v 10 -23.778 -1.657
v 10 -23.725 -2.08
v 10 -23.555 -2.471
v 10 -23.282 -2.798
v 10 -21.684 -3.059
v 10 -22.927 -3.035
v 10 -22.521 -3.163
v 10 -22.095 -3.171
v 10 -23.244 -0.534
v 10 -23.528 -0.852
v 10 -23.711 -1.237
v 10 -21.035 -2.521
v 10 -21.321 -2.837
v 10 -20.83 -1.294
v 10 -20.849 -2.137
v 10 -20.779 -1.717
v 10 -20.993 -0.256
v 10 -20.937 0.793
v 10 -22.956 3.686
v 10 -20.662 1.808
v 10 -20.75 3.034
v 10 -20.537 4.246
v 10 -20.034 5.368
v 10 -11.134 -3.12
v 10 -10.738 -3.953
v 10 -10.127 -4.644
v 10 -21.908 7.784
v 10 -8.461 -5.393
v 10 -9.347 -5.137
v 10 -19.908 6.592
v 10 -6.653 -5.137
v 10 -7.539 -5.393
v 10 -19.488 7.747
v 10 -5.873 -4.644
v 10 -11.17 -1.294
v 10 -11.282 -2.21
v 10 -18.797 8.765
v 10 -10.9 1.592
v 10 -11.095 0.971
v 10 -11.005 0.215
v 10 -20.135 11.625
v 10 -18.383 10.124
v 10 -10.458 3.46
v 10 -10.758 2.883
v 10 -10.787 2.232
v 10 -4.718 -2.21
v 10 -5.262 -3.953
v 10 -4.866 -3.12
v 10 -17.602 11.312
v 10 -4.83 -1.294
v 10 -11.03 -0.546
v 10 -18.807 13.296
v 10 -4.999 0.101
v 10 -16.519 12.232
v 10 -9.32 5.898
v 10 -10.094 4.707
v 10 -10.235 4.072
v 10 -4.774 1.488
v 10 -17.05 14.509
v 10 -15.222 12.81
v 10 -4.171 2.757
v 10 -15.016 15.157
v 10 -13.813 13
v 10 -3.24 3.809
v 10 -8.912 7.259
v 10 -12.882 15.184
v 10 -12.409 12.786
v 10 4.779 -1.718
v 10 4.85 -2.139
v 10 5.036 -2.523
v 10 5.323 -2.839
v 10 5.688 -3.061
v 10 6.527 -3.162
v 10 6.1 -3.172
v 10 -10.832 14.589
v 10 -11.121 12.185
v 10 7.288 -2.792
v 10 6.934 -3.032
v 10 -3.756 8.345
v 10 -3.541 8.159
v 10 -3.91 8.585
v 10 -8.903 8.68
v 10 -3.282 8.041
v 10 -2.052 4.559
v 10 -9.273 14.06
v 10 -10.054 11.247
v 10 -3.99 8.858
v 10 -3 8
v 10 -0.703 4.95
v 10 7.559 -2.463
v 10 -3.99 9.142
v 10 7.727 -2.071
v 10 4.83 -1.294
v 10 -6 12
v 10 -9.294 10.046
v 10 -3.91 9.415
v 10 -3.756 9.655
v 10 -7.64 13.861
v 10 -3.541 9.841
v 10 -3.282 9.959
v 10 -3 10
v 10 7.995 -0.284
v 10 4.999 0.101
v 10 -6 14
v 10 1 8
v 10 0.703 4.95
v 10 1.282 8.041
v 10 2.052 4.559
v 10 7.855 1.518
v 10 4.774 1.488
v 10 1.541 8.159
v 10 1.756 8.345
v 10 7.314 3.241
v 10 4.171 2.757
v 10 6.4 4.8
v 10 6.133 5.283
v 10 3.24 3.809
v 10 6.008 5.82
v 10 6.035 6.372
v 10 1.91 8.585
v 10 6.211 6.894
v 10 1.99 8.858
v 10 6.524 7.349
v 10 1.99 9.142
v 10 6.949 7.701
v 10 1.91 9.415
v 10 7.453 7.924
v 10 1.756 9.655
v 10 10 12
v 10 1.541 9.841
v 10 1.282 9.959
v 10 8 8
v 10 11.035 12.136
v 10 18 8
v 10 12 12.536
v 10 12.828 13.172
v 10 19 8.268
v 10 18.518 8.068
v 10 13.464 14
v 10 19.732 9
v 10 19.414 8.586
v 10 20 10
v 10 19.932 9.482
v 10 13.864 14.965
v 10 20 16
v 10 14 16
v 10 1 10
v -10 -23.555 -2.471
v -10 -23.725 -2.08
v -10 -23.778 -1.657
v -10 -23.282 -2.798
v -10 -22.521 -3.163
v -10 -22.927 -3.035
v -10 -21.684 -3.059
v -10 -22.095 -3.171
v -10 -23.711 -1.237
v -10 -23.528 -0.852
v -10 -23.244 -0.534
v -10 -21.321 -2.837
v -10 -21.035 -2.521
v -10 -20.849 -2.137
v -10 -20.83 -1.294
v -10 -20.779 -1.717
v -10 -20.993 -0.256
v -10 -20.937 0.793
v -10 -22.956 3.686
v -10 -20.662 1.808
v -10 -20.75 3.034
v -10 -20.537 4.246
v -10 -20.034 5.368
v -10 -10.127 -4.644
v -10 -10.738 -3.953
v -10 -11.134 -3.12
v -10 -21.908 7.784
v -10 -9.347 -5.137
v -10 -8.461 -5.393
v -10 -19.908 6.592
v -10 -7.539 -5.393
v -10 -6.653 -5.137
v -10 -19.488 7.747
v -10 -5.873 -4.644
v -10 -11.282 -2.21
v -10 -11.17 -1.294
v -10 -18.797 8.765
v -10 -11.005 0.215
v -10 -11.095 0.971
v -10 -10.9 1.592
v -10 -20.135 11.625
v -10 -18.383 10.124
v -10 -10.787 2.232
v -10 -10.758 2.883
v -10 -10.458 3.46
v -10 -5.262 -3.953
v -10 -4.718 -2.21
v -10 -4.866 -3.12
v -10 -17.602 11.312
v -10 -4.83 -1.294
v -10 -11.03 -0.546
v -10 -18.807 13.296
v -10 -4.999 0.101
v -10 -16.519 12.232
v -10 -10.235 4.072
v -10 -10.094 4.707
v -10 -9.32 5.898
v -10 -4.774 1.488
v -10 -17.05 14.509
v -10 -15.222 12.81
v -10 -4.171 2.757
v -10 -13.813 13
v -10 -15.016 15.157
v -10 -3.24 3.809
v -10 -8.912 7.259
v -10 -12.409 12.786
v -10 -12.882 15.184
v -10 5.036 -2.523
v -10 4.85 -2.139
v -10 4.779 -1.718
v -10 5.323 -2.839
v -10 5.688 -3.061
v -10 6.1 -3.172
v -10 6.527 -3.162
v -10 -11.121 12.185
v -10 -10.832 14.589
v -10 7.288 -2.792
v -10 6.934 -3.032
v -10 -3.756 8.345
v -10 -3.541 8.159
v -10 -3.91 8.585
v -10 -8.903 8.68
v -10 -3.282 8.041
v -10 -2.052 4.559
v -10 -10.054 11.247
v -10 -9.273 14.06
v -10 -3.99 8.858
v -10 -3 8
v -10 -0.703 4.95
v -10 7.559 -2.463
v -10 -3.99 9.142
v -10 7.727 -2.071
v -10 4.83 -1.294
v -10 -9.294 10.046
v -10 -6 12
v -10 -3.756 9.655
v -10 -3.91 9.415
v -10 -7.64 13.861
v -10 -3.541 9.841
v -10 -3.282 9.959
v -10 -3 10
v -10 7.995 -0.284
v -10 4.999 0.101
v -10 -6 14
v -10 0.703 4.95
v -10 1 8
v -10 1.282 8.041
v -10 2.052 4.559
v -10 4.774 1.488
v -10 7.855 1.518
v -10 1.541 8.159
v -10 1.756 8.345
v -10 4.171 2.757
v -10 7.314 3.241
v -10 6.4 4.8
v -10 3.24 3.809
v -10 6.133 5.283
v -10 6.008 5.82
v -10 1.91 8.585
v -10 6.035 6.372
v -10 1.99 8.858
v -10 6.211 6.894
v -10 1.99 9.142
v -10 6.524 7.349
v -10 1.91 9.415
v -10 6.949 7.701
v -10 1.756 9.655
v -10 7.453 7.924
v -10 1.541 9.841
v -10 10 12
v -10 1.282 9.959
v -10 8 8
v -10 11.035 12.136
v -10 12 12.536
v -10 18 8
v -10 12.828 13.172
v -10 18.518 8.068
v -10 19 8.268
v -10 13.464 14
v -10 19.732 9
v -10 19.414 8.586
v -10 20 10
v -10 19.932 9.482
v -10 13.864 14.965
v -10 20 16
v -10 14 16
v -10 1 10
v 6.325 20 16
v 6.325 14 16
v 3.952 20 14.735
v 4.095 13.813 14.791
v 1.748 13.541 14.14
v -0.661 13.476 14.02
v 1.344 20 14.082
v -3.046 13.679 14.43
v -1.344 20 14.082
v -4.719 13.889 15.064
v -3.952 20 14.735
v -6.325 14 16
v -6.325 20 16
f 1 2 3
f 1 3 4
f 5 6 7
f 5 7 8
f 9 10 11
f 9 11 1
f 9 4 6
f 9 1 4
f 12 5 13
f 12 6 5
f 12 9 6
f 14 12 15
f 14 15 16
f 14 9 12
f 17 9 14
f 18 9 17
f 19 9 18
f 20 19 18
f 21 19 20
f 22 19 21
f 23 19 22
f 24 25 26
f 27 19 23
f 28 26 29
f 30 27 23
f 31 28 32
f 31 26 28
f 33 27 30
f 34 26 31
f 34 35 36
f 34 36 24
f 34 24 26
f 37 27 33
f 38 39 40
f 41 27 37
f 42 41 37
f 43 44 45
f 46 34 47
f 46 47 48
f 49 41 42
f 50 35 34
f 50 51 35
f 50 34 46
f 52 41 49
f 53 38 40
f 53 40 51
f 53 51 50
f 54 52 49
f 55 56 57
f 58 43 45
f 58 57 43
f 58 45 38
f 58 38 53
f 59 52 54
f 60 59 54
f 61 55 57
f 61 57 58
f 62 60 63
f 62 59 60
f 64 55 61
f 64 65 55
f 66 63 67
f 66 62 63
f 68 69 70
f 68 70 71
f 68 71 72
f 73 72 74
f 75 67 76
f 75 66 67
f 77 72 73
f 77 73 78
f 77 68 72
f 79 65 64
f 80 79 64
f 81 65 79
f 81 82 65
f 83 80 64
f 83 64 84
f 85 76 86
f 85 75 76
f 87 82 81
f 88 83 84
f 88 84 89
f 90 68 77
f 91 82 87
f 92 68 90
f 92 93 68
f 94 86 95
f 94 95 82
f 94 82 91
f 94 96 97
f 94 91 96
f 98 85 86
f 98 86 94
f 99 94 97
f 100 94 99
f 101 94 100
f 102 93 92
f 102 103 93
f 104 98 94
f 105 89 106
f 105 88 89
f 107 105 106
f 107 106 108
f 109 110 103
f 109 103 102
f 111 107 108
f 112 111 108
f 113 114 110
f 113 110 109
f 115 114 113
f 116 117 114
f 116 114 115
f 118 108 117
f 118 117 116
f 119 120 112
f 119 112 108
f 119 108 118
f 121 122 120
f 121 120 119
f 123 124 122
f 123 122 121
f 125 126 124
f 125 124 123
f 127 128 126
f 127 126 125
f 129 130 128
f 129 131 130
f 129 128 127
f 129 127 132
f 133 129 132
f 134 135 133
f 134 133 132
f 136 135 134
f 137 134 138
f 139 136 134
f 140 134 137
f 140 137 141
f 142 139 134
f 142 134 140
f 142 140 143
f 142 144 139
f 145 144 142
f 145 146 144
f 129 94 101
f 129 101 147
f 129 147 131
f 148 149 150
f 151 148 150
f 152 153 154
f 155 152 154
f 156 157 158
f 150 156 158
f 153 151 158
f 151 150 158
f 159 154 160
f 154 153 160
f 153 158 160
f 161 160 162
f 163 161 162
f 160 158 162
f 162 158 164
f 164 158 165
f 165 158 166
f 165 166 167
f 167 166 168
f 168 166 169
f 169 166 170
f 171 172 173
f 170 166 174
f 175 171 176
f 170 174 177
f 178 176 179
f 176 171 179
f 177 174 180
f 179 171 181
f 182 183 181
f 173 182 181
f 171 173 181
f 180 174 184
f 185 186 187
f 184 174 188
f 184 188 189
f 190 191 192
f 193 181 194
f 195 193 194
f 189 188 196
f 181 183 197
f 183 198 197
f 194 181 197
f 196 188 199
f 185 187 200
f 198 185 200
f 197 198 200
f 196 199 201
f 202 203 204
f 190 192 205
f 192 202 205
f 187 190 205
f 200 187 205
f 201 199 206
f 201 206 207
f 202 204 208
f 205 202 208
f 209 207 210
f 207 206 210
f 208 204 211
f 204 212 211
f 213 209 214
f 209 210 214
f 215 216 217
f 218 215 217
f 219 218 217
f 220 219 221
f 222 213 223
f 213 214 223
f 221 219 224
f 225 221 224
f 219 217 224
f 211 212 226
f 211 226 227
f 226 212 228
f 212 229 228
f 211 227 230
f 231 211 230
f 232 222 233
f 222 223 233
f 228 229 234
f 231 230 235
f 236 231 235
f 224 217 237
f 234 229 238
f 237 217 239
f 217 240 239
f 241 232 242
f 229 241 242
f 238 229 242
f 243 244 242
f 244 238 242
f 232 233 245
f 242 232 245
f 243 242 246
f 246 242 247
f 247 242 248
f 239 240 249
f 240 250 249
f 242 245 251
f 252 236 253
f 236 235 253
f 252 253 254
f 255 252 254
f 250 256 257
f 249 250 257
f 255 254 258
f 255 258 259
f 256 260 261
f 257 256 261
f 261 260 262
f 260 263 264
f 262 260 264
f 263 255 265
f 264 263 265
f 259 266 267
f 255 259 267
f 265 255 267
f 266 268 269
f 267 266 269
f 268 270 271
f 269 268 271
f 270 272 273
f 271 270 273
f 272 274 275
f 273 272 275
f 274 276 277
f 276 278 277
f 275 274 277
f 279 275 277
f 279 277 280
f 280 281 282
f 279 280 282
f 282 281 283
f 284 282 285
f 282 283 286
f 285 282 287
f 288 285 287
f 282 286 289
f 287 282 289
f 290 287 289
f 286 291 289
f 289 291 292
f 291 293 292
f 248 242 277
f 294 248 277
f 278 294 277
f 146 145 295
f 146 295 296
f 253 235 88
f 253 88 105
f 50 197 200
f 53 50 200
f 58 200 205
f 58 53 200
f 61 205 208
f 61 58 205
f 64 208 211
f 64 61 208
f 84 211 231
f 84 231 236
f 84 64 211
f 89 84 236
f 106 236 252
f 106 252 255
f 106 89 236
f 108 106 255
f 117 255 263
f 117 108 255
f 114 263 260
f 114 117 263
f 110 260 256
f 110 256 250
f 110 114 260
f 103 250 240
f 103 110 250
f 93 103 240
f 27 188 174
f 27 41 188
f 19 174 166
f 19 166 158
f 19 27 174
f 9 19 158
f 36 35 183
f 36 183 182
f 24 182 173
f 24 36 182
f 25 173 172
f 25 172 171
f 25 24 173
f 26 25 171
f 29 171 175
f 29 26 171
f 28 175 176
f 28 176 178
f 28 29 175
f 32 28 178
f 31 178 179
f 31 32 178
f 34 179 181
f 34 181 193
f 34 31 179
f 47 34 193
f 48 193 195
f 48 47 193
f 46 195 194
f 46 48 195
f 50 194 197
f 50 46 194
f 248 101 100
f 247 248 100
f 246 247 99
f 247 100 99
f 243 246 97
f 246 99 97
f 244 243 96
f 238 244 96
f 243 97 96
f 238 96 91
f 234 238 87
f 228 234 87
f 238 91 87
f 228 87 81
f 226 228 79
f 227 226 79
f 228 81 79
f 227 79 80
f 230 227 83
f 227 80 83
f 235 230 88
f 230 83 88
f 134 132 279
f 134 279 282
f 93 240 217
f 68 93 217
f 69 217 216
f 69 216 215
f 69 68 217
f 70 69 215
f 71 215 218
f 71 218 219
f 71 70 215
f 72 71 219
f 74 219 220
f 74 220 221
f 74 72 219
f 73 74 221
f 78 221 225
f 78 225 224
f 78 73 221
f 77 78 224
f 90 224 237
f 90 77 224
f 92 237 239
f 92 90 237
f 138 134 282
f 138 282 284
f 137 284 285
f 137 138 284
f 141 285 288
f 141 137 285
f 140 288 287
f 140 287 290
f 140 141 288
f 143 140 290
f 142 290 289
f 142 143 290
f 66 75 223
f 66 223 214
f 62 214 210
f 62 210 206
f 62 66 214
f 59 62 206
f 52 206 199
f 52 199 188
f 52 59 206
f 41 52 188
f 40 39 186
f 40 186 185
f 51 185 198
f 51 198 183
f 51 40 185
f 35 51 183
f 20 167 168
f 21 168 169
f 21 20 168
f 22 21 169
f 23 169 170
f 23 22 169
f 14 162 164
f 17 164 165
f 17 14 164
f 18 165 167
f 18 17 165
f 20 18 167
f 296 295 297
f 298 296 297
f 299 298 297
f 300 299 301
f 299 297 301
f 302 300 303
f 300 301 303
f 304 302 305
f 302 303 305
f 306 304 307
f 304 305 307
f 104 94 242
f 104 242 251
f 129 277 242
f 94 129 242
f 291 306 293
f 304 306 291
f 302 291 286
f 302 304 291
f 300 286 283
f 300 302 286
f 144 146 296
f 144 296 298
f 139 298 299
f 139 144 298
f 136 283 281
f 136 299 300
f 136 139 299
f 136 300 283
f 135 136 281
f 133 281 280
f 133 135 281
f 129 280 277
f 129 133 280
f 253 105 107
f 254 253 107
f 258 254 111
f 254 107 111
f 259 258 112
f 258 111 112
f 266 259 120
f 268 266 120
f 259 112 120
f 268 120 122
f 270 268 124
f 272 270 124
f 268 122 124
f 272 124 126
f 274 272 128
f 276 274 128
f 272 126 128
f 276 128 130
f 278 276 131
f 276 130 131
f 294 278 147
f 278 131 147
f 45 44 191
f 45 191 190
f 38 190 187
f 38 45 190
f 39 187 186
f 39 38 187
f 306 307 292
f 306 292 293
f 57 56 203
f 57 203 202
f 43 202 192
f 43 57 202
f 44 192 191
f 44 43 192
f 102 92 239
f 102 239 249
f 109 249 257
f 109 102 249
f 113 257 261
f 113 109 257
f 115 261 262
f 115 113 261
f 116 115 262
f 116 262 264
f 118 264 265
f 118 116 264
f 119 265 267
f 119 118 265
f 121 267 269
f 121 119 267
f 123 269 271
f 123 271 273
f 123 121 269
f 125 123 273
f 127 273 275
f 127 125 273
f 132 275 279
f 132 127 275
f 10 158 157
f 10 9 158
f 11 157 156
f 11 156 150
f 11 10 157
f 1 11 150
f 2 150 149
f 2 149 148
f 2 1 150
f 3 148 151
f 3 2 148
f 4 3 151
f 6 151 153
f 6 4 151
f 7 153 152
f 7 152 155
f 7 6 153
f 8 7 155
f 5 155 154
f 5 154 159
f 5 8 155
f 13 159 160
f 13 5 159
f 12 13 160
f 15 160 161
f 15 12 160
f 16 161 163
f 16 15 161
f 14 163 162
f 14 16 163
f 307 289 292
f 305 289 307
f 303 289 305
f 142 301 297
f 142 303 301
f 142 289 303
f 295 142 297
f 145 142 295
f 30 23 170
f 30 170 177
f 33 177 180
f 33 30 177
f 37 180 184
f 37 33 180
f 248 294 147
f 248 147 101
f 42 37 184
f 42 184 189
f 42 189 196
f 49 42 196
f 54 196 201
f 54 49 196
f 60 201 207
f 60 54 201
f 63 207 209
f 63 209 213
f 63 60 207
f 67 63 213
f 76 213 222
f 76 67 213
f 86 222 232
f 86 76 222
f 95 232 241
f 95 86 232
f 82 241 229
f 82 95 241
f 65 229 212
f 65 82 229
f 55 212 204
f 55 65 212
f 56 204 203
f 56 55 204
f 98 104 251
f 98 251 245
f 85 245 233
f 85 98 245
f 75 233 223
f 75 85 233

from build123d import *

# Parameters (mm, degrees)
F1_DEPTH = 10
F3_DEPTH = 20
F5_DEPTH = 7.5358984849


with BuildPart() as f1:
    # F0 (on Right) → F1 (new body, symmetric)
    with BuildSketch(Plane.YZ):
        with BuildLine():
            ThreePointArc((-20.8296291314, -1.2940952255), (-20.9926964007, 0.2701530127), (-20.6617935804, 1.8076727064))
            ThreePointArc((-20.6617935804, 1.8076727064), (-20.6809628133, 3.646611731), (-20.0339954379, 5.3680928987))
            ThreePointArc((-20.0339954379, 5.3680928987), (-19.7335450365, 7.1824230098), (-18.7974744816, 8.7654063047))
            ThreePointArc((-18.7974744816, 8.7654063047), (-11.7433151518, 12.5315389352), (-10.0940139115, 4.7069159885))
            ThreePointArc((-10.0940139115, 4.7069159885), (-10.3366188286, 3.7622215766), (-10.7580105429, 2.8826002371))
            ThreePointArc((-10.7580105429, 2.8826002371), (-10.8328852831, 1.9101299543), (-11.0951304678, 0.9706981363))
            ThreePointArc((-11.0951304678, 0.9706981363), (-11.0027569299, -0.1660171642), (-11.1703708686, -1.2940952255))
            ThreePointArc((-11.1703708686, -1.2940952255), (-8, -5.4258029827), (-4.8296291314, -1.2940952255))
            ThreePointArc((-4.8296291314, -1.2940952255), (0, 5), (4.8296291314, -1.2940952255))
            ThreePointArc((4.8296291314, -1.2940952255), (5.8902893032, -3.1312125326), (7.7274066103, -2.0705523608))
            ThreePointArc((7.7274066103, -2.0705523608), (7.8547454968, 1.517555001), (6.4, 4.8))
            ThreePointArc((6.4, 4.8), (6.211145618, 6.894427191), (8, 8))
            Line((8, 8), (18, 8))
            ThreePointArc((18, 8), (19.4142135624, 8.5857864376), (20, 10))
            Line((20, 10), (20, 16))
            Line((20, 16), (14, 16))
            ThreePointArc((14, 16), (12.8284271247, 13.1715728753), (10, 12))
            Line((10, 12), (-6, 12))
            Line((-6, 12), (-6, 14))
            ThreePointArc((-6, 14), (-8.4616553345, 13.9180532248), (-10.8315712253, 14.5888444966))
            ThreePointArc((-10.8315712253, 14.5888444966), (-16.0570828985, 14.9079319058), (-20.135090638, 11.625))
            ThreePointArc((-20.135090638, 11.625), (-22.5254325043, 5.7591136901), (-23.2438614431, -0.5342332969))
            ThreePointArc((-23.2438614431, -0.5342332969), (-22.7288527683, -3.1131272319), (-20.8296291314, -1.2940952255))
        make_face()
    extrude(amount=F1_DEPTH, both=True)

    # F2 (on face) → F3 (cut, through all)
    with BuildSketch(Plane.YZ.offset(10)):
        with BuildLine():
            Line((1, 10), (-3, 10))
            ThreePointArc((-3, 10), (-4, 9), (-3, 8))
            Line((-3, 8), (1, 8))
            ThreePointArc((1, 8), (2, 9), (1, 10))
        make_face()
    extrude(amount=-F3_DEPTH, mode=Mode.SUBTRACT)

    # F4 (on face) → F5 (cut, up to face)
    with BuildSketch(Plane(origin=(0, 20, 0), x_dir=(-1, 0, 0), z_dir=(0, 1, 0))):
        with BuildLine():
            Line((6.3245553203, 16), (-6.3245553203, 16))
            ThreePointArc((-6.3245553203, 16), (0, 14), (6.3245553203, 16))
        make_face()
    extrude(amount=-F5_DEPTH, mode=Mode.SUBTRACT)


solid = f1.part
